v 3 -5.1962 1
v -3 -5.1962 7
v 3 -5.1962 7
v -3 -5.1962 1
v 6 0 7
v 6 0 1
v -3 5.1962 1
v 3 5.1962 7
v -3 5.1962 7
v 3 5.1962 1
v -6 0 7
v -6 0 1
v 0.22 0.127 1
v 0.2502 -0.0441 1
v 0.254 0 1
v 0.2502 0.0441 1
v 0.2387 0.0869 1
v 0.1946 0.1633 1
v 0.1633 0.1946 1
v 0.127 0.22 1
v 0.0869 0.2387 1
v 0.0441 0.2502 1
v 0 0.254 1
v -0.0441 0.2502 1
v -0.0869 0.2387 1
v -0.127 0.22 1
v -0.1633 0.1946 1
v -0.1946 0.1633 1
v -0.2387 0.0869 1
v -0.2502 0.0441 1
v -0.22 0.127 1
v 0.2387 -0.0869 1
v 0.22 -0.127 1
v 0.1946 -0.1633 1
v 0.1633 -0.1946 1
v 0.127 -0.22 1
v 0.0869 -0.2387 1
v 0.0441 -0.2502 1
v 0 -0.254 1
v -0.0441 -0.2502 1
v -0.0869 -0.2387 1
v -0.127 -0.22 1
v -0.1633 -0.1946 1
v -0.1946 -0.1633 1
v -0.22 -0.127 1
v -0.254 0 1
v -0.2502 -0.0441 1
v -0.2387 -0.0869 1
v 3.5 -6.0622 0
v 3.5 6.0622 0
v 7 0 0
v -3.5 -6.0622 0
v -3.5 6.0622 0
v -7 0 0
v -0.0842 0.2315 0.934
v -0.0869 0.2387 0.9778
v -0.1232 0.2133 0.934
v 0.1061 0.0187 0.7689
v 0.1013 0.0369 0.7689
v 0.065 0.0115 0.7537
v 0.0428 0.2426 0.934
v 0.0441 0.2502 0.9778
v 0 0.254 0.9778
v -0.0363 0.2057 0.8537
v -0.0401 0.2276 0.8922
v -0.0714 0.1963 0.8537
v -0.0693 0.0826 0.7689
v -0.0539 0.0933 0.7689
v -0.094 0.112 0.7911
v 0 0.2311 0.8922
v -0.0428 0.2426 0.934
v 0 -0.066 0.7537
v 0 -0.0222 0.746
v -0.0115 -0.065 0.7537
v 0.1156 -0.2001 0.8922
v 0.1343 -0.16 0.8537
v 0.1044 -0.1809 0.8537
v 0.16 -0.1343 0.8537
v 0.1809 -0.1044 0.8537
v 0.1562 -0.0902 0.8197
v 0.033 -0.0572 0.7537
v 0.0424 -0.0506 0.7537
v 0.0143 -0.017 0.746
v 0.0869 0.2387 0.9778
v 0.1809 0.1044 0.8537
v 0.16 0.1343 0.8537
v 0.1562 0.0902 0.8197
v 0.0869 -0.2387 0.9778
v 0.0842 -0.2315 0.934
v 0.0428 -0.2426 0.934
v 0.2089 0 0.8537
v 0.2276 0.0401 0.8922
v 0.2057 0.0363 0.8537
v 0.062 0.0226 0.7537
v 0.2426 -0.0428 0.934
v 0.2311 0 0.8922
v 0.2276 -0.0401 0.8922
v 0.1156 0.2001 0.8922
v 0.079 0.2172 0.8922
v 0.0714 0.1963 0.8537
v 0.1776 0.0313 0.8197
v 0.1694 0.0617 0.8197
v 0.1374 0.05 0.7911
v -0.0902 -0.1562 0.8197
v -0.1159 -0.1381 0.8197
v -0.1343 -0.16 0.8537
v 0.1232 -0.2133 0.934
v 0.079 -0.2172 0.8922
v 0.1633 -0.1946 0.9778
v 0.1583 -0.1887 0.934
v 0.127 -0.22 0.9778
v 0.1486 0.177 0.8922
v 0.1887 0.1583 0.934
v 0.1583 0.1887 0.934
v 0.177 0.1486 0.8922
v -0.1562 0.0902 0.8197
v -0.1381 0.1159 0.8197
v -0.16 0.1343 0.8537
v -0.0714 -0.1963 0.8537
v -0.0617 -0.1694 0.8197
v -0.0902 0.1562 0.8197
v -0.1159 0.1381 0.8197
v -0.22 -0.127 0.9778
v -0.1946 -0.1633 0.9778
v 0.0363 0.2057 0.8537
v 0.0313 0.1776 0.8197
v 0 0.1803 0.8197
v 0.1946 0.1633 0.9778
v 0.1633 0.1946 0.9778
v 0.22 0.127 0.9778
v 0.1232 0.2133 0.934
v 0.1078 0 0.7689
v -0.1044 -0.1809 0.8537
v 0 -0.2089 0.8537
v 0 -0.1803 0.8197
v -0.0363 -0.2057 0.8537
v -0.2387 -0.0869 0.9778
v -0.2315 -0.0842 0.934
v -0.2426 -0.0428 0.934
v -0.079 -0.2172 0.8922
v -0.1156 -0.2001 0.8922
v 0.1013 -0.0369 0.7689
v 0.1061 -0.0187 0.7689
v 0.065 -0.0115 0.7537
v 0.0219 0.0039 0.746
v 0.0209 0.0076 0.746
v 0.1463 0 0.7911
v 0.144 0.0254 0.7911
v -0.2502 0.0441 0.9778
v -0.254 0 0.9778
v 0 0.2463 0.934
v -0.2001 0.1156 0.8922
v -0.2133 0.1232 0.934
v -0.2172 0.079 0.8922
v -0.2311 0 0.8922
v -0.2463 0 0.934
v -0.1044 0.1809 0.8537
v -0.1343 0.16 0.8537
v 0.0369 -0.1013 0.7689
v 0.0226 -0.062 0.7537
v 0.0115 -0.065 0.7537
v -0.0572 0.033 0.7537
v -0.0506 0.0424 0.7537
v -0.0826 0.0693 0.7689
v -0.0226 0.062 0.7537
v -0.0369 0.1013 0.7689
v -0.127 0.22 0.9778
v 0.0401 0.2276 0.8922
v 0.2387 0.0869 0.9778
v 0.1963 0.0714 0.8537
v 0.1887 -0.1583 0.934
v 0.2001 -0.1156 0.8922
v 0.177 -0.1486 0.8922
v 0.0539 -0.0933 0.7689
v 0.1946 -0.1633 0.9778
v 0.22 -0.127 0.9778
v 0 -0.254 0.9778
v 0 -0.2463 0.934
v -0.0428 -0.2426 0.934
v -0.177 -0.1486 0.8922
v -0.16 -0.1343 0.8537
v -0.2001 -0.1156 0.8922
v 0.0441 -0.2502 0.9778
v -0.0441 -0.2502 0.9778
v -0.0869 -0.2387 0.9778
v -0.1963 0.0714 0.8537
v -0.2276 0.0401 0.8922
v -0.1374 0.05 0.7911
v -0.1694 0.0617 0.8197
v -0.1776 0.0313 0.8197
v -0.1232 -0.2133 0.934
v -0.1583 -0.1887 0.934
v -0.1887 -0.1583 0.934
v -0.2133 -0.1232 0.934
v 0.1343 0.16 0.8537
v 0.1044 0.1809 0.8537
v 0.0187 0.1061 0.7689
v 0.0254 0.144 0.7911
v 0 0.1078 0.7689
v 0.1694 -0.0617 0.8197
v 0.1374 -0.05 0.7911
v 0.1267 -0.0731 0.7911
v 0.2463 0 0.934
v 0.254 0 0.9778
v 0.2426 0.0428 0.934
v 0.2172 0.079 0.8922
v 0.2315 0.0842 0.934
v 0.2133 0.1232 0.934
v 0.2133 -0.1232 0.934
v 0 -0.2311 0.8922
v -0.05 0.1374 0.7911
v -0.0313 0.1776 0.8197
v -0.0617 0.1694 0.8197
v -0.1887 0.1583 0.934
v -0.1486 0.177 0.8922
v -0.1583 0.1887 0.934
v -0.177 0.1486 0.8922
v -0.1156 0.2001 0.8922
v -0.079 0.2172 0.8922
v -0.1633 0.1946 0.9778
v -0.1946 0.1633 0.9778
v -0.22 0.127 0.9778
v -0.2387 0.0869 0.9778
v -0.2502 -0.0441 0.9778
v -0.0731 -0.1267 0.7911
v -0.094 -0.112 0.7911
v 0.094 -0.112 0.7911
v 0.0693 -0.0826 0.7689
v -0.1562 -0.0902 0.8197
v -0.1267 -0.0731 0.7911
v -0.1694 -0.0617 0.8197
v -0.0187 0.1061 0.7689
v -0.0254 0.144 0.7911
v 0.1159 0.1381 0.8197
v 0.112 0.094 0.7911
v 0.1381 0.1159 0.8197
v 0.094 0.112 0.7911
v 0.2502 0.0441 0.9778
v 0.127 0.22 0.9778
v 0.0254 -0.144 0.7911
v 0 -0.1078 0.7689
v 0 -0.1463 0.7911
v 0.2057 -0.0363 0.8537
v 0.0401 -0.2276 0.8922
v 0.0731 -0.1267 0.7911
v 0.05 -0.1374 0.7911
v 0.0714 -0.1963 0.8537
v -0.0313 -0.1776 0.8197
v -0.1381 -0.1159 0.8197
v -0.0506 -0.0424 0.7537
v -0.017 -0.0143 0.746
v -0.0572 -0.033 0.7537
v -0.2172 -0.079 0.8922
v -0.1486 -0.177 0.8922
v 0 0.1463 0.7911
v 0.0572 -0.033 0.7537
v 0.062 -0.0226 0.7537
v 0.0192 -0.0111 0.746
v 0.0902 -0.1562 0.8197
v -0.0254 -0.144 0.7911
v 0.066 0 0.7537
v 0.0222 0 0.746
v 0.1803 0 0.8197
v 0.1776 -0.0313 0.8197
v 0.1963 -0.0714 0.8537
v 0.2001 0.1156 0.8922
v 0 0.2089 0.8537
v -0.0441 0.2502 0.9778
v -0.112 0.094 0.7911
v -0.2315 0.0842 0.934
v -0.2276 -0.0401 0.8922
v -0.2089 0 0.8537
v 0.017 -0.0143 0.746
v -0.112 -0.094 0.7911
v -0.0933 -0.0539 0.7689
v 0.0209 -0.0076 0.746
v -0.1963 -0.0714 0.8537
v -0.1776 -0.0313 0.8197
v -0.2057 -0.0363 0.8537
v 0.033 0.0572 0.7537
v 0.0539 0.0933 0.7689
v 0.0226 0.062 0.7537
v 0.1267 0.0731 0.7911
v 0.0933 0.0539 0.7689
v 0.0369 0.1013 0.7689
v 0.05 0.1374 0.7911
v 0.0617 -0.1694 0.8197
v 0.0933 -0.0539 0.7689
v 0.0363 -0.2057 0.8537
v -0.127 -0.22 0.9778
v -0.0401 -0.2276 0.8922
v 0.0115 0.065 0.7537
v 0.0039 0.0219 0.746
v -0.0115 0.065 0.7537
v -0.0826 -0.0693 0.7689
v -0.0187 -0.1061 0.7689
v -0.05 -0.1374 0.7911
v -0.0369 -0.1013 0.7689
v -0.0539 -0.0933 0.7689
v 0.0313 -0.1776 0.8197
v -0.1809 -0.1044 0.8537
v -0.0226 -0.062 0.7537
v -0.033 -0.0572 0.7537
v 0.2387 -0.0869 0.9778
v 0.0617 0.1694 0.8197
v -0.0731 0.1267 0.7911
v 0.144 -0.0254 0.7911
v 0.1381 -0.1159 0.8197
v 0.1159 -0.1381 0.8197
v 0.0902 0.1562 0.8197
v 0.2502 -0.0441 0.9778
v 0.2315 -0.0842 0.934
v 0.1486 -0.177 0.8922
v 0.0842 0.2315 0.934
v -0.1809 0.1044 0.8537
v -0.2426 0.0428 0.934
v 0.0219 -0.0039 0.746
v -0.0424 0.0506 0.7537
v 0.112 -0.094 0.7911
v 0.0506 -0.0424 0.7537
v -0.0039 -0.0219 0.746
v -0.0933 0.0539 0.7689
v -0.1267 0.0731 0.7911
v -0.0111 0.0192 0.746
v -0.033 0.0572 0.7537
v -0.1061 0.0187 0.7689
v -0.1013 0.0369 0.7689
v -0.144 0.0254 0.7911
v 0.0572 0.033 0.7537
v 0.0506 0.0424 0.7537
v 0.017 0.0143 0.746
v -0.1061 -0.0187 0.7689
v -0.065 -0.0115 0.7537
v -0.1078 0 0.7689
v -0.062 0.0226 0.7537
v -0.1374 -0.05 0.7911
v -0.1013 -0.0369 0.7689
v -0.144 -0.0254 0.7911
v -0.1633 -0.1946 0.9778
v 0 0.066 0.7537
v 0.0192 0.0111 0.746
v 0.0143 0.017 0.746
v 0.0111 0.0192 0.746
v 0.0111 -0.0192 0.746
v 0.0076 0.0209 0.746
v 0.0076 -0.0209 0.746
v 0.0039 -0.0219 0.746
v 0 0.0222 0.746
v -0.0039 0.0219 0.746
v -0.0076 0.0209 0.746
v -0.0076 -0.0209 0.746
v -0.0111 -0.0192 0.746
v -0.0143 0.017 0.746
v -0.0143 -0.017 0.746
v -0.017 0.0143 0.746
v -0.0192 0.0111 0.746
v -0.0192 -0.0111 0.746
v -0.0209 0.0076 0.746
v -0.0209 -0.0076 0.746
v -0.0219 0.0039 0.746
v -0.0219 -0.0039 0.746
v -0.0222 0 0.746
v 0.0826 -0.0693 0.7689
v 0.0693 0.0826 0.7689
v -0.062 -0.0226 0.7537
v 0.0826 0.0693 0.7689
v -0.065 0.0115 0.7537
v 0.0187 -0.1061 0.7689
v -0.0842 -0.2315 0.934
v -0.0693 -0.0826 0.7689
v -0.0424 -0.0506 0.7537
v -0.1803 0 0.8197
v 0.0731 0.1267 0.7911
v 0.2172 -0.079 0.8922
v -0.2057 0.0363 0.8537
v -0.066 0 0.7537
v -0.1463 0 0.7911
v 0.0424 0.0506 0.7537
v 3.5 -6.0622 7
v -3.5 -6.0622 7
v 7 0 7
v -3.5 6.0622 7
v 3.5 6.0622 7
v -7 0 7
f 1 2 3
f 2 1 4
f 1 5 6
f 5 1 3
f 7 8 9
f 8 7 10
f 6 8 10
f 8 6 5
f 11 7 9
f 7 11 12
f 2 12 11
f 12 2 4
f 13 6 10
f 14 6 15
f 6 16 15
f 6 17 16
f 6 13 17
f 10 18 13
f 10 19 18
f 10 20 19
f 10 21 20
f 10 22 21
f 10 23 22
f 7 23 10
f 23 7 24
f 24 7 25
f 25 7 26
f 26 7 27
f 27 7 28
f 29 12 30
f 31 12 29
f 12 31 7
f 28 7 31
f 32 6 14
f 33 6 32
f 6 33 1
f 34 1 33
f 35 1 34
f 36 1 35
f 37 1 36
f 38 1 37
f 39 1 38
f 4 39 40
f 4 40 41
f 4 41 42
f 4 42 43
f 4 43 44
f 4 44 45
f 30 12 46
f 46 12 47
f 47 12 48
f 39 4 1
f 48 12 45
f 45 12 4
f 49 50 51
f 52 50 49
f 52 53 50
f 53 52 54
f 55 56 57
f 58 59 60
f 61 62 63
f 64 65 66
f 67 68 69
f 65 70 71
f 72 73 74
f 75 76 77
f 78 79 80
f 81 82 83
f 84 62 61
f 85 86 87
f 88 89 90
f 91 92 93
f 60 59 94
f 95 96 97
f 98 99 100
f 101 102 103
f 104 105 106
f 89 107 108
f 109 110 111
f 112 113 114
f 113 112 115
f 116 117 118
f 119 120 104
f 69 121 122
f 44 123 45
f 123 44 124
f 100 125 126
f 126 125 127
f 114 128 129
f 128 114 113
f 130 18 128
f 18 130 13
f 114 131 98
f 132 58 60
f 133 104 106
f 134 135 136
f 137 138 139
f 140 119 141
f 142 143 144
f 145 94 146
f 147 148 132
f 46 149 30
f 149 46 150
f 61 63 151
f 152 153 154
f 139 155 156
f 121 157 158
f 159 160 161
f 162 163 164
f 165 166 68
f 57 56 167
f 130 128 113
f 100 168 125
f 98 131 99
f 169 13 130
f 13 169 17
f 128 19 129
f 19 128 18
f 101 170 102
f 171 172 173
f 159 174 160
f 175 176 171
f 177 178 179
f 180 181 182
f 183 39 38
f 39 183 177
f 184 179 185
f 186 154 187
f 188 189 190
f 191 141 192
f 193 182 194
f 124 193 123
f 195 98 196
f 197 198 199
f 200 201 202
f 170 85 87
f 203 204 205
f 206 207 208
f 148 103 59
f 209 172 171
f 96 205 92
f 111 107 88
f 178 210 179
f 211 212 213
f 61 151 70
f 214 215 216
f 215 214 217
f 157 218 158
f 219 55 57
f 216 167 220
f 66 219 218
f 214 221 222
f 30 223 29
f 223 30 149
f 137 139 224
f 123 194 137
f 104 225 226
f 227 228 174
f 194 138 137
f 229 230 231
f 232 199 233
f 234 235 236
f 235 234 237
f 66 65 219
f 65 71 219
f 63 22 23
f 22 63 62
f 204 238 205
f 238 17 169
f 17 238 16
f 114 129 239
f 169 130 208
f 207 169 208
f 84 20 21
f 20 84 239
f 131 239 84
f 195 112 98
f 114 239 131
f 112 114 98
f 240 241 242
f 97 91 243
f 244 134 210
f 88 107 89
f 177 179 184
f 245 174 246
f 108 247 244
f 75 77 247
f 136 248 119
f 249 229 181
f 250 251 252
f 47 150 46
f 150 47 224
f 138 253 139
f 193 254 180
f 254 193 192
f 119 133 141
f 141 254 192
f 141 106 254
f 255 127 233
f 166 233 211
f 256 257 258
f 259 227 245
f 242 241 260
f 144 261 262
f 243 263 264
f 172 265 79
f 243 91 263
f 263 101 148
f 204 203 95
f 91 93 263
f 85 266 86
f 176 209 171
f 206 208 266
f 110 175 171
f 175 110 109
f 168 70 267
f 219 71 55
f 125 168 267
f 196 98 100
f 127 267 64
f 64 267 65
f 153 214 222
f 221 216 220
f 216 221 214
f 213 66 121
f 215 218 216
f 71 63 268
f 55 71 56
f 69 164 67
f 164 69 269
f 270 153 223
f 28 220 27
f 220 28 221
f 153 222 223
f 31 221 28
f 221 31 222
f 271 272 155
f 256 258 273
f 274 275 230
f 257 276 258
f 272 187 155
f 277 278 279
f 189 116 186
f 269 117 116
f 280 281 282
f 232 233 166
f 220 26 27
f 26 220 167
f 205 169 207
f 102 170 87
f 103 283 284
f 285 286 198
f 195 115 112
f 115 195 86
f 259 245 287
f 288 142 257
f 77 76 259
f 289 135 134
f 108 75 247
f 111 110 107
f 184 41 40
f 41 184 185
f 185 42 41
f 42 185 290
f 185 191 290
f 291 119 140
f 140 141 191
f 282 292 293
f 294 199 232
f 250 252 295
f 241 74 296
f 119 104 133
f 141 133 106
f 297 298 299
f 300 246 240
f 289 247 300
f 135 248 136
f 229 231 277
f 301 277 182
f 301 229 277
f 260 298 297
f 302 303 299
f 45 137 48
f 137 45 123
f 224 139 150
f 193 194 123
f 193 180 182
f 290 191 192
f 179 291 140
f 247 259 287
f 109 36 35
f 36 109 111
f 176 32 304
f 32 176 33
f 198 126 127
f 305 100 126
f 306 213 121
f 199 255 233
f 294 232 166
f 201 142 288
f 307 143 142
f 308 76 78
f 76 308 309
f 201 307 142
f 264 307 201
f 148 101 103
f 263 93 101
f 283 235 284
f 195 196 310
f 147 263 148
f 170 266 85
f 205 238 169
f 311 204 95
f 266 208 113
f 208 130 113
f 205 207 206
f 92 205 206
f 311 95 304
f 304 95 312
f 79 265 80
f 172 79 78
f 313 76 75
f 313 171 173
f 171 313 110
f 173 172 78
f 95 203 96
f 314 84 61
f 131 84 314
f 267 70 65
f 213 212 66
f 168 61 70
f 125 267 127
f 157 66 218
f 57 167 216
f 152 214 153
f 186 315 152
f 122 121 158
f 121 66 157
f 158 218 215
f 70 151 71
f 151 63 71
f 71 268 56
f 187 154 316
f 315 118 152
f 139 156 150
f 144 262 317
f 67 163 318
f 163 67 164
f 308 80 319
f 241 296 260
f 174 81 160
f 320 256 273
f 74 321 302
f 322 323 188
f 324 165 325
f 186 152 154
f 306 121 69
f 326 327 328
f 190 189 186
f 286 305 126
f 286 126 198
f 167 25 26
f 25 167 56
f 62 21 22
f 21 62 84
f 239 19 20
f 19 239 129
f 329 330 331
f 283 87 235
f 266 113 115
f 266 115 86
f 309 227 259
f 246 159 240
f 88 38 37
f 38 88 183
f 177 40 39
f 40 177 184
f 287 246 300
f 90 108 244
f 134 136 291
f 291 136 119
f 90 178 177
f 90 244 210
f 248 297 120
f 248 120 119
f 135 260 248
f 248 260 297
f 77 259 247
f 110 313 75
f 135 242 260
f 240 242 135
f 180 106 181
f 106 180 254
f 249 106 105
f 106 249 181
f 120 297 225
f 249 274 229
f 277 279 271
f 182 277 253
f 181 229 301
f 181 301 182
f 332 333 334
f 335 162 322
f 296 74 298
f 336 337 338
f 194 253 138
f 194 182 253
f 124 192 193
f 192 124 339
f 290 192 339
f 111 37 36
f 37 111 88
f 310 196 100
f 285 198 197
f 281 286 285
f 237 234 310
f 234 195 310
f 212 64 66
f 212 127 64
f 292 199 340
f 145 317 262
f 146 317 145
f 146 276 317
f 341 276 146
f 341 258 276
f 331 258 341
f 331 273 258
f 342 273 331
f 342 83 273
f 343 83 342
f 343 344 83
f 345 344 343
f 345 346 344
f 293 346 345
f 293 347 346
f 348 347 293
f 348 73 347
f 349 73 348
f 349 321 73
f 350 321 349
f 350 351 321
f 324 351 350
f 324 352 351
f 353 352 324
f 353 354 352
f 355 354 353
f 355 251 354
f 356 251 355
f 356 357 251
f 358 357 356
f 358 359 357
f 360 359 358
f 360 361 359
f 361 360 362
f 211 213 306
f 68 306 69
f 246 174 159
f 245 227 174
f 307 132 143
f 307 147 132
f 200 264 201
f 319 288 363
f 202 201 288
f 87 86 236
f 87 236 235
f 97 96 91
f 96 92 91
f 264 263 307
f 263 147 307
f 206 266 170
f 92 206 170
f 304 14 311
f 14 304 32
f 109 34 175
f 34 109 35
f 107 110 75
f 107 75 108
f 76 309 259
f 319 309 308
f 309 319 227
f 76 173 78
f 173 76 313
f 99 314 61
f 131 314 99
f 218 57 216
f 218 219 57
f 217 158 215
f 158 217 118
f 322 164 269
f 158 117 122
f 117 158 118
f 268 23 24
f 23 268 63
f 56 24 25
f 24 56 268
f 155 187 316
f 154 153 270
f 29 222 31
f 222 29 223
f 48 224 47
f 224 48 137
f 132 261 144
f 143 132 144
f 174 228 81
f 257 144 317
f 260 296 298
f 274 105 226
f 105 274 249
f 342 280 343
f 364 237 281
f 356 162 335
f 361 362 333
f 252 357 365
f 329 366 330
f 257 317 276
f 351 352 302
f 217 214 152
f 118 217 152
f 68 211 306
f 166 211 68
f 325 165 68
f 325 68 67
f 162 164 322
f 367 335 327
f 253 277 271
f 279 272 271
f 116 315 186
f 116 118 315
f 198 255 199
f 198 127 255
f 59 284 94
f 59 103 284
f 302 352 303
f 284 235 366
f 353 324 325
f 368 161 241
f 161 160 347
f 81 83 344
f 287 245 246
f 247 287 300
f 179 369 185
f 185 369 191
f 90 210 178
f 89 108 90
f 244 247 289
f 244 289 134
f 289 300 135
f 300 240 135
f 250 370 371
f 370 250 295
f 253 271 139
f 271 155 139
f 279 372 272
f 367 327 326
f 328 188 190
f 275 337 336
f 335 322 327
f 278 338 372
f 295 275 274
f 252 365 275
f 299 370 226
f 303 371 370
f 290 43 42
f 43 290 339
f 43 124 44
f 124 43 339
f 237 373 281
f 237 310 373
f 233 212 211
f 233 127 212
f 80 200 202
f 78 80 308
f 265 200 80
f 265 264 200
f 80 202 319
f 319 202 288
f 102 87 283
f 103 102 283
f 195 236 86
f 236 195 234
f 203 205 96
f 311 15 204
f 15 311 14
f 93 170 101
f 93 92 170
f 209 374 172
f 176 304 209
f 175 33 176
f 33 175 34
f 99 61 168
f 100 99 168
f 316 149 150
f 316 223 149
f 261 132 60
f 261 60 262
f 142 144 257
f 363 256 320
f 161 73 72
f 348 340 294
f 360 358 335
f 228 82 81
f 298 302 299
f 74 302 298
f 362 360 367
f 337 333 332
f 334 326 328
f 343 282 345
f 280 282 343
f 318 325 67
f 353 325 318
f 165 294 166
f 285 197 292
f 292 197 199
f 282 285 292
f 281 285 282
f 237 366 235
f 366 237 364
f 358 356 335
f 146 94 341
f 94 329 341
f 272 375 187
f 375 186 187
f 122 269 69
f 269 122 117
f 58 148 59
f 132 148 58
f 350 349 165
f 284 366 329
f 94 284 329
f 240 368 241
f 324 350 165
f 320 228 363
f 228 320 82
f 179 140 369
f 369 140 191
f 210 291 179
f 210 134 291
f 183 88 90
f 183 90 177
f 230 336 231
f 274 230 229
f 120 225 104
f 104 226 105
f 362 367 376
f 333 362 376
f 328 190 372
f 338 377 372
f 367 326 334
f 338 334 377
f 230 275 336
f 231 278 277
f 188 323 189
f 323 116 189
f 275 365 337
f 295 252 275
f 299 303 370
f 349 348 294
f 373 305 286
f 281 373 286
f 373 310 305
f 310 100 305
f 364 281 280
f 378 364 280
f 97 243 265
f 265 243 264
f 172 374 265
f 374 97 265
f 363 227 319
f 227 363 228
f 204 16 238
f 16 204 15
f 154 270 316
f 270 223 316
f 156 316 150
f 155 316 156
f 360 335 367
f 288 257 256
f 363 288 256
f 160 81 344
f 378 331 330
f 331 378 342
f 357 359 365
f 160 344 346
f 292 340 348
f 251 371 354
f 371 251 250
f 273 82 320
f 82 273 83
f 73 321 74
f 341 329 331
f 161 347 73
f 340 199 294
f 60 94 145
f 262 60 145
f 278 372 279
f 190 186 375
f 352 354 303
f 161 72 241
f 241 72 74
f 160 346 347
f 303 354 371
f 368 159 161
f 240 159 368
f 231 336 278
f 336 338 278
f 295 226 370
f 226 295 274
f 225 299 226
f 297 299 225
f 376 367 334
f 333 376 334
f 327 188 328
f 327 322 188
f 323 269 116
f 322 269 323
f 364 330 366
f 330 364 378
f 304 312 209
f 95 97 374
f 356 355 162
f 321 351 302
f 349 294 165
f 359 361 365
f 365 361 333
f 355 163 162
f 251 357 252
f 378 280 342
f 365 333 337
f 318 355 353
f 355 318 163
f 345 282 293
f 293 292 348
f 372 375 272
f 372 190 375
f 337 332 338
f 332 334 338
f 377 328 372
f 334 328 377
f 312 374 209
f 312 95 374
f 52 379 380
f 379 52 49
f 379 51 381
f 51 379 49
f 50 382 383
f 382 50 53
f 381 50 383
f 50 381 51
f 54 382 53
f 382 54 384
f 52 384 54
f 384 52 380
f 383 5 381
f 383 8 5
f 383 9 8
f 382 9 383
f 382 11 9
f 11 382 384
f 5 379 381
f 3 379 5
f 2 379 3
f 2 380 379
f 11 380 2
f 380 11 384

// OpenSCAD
//floor
$fn = 6;
difference() {
    cylinder(r = 6, h = 1);
    translate([0,0,1]) {
        $fn = 36;
        sphere(d = 0.5+0.01);
    }
}

//walls
$fn = 6;
difference() {
    cylinder(r = 7, h = 7);
    cylinder(r = 6, h = 7);
}
